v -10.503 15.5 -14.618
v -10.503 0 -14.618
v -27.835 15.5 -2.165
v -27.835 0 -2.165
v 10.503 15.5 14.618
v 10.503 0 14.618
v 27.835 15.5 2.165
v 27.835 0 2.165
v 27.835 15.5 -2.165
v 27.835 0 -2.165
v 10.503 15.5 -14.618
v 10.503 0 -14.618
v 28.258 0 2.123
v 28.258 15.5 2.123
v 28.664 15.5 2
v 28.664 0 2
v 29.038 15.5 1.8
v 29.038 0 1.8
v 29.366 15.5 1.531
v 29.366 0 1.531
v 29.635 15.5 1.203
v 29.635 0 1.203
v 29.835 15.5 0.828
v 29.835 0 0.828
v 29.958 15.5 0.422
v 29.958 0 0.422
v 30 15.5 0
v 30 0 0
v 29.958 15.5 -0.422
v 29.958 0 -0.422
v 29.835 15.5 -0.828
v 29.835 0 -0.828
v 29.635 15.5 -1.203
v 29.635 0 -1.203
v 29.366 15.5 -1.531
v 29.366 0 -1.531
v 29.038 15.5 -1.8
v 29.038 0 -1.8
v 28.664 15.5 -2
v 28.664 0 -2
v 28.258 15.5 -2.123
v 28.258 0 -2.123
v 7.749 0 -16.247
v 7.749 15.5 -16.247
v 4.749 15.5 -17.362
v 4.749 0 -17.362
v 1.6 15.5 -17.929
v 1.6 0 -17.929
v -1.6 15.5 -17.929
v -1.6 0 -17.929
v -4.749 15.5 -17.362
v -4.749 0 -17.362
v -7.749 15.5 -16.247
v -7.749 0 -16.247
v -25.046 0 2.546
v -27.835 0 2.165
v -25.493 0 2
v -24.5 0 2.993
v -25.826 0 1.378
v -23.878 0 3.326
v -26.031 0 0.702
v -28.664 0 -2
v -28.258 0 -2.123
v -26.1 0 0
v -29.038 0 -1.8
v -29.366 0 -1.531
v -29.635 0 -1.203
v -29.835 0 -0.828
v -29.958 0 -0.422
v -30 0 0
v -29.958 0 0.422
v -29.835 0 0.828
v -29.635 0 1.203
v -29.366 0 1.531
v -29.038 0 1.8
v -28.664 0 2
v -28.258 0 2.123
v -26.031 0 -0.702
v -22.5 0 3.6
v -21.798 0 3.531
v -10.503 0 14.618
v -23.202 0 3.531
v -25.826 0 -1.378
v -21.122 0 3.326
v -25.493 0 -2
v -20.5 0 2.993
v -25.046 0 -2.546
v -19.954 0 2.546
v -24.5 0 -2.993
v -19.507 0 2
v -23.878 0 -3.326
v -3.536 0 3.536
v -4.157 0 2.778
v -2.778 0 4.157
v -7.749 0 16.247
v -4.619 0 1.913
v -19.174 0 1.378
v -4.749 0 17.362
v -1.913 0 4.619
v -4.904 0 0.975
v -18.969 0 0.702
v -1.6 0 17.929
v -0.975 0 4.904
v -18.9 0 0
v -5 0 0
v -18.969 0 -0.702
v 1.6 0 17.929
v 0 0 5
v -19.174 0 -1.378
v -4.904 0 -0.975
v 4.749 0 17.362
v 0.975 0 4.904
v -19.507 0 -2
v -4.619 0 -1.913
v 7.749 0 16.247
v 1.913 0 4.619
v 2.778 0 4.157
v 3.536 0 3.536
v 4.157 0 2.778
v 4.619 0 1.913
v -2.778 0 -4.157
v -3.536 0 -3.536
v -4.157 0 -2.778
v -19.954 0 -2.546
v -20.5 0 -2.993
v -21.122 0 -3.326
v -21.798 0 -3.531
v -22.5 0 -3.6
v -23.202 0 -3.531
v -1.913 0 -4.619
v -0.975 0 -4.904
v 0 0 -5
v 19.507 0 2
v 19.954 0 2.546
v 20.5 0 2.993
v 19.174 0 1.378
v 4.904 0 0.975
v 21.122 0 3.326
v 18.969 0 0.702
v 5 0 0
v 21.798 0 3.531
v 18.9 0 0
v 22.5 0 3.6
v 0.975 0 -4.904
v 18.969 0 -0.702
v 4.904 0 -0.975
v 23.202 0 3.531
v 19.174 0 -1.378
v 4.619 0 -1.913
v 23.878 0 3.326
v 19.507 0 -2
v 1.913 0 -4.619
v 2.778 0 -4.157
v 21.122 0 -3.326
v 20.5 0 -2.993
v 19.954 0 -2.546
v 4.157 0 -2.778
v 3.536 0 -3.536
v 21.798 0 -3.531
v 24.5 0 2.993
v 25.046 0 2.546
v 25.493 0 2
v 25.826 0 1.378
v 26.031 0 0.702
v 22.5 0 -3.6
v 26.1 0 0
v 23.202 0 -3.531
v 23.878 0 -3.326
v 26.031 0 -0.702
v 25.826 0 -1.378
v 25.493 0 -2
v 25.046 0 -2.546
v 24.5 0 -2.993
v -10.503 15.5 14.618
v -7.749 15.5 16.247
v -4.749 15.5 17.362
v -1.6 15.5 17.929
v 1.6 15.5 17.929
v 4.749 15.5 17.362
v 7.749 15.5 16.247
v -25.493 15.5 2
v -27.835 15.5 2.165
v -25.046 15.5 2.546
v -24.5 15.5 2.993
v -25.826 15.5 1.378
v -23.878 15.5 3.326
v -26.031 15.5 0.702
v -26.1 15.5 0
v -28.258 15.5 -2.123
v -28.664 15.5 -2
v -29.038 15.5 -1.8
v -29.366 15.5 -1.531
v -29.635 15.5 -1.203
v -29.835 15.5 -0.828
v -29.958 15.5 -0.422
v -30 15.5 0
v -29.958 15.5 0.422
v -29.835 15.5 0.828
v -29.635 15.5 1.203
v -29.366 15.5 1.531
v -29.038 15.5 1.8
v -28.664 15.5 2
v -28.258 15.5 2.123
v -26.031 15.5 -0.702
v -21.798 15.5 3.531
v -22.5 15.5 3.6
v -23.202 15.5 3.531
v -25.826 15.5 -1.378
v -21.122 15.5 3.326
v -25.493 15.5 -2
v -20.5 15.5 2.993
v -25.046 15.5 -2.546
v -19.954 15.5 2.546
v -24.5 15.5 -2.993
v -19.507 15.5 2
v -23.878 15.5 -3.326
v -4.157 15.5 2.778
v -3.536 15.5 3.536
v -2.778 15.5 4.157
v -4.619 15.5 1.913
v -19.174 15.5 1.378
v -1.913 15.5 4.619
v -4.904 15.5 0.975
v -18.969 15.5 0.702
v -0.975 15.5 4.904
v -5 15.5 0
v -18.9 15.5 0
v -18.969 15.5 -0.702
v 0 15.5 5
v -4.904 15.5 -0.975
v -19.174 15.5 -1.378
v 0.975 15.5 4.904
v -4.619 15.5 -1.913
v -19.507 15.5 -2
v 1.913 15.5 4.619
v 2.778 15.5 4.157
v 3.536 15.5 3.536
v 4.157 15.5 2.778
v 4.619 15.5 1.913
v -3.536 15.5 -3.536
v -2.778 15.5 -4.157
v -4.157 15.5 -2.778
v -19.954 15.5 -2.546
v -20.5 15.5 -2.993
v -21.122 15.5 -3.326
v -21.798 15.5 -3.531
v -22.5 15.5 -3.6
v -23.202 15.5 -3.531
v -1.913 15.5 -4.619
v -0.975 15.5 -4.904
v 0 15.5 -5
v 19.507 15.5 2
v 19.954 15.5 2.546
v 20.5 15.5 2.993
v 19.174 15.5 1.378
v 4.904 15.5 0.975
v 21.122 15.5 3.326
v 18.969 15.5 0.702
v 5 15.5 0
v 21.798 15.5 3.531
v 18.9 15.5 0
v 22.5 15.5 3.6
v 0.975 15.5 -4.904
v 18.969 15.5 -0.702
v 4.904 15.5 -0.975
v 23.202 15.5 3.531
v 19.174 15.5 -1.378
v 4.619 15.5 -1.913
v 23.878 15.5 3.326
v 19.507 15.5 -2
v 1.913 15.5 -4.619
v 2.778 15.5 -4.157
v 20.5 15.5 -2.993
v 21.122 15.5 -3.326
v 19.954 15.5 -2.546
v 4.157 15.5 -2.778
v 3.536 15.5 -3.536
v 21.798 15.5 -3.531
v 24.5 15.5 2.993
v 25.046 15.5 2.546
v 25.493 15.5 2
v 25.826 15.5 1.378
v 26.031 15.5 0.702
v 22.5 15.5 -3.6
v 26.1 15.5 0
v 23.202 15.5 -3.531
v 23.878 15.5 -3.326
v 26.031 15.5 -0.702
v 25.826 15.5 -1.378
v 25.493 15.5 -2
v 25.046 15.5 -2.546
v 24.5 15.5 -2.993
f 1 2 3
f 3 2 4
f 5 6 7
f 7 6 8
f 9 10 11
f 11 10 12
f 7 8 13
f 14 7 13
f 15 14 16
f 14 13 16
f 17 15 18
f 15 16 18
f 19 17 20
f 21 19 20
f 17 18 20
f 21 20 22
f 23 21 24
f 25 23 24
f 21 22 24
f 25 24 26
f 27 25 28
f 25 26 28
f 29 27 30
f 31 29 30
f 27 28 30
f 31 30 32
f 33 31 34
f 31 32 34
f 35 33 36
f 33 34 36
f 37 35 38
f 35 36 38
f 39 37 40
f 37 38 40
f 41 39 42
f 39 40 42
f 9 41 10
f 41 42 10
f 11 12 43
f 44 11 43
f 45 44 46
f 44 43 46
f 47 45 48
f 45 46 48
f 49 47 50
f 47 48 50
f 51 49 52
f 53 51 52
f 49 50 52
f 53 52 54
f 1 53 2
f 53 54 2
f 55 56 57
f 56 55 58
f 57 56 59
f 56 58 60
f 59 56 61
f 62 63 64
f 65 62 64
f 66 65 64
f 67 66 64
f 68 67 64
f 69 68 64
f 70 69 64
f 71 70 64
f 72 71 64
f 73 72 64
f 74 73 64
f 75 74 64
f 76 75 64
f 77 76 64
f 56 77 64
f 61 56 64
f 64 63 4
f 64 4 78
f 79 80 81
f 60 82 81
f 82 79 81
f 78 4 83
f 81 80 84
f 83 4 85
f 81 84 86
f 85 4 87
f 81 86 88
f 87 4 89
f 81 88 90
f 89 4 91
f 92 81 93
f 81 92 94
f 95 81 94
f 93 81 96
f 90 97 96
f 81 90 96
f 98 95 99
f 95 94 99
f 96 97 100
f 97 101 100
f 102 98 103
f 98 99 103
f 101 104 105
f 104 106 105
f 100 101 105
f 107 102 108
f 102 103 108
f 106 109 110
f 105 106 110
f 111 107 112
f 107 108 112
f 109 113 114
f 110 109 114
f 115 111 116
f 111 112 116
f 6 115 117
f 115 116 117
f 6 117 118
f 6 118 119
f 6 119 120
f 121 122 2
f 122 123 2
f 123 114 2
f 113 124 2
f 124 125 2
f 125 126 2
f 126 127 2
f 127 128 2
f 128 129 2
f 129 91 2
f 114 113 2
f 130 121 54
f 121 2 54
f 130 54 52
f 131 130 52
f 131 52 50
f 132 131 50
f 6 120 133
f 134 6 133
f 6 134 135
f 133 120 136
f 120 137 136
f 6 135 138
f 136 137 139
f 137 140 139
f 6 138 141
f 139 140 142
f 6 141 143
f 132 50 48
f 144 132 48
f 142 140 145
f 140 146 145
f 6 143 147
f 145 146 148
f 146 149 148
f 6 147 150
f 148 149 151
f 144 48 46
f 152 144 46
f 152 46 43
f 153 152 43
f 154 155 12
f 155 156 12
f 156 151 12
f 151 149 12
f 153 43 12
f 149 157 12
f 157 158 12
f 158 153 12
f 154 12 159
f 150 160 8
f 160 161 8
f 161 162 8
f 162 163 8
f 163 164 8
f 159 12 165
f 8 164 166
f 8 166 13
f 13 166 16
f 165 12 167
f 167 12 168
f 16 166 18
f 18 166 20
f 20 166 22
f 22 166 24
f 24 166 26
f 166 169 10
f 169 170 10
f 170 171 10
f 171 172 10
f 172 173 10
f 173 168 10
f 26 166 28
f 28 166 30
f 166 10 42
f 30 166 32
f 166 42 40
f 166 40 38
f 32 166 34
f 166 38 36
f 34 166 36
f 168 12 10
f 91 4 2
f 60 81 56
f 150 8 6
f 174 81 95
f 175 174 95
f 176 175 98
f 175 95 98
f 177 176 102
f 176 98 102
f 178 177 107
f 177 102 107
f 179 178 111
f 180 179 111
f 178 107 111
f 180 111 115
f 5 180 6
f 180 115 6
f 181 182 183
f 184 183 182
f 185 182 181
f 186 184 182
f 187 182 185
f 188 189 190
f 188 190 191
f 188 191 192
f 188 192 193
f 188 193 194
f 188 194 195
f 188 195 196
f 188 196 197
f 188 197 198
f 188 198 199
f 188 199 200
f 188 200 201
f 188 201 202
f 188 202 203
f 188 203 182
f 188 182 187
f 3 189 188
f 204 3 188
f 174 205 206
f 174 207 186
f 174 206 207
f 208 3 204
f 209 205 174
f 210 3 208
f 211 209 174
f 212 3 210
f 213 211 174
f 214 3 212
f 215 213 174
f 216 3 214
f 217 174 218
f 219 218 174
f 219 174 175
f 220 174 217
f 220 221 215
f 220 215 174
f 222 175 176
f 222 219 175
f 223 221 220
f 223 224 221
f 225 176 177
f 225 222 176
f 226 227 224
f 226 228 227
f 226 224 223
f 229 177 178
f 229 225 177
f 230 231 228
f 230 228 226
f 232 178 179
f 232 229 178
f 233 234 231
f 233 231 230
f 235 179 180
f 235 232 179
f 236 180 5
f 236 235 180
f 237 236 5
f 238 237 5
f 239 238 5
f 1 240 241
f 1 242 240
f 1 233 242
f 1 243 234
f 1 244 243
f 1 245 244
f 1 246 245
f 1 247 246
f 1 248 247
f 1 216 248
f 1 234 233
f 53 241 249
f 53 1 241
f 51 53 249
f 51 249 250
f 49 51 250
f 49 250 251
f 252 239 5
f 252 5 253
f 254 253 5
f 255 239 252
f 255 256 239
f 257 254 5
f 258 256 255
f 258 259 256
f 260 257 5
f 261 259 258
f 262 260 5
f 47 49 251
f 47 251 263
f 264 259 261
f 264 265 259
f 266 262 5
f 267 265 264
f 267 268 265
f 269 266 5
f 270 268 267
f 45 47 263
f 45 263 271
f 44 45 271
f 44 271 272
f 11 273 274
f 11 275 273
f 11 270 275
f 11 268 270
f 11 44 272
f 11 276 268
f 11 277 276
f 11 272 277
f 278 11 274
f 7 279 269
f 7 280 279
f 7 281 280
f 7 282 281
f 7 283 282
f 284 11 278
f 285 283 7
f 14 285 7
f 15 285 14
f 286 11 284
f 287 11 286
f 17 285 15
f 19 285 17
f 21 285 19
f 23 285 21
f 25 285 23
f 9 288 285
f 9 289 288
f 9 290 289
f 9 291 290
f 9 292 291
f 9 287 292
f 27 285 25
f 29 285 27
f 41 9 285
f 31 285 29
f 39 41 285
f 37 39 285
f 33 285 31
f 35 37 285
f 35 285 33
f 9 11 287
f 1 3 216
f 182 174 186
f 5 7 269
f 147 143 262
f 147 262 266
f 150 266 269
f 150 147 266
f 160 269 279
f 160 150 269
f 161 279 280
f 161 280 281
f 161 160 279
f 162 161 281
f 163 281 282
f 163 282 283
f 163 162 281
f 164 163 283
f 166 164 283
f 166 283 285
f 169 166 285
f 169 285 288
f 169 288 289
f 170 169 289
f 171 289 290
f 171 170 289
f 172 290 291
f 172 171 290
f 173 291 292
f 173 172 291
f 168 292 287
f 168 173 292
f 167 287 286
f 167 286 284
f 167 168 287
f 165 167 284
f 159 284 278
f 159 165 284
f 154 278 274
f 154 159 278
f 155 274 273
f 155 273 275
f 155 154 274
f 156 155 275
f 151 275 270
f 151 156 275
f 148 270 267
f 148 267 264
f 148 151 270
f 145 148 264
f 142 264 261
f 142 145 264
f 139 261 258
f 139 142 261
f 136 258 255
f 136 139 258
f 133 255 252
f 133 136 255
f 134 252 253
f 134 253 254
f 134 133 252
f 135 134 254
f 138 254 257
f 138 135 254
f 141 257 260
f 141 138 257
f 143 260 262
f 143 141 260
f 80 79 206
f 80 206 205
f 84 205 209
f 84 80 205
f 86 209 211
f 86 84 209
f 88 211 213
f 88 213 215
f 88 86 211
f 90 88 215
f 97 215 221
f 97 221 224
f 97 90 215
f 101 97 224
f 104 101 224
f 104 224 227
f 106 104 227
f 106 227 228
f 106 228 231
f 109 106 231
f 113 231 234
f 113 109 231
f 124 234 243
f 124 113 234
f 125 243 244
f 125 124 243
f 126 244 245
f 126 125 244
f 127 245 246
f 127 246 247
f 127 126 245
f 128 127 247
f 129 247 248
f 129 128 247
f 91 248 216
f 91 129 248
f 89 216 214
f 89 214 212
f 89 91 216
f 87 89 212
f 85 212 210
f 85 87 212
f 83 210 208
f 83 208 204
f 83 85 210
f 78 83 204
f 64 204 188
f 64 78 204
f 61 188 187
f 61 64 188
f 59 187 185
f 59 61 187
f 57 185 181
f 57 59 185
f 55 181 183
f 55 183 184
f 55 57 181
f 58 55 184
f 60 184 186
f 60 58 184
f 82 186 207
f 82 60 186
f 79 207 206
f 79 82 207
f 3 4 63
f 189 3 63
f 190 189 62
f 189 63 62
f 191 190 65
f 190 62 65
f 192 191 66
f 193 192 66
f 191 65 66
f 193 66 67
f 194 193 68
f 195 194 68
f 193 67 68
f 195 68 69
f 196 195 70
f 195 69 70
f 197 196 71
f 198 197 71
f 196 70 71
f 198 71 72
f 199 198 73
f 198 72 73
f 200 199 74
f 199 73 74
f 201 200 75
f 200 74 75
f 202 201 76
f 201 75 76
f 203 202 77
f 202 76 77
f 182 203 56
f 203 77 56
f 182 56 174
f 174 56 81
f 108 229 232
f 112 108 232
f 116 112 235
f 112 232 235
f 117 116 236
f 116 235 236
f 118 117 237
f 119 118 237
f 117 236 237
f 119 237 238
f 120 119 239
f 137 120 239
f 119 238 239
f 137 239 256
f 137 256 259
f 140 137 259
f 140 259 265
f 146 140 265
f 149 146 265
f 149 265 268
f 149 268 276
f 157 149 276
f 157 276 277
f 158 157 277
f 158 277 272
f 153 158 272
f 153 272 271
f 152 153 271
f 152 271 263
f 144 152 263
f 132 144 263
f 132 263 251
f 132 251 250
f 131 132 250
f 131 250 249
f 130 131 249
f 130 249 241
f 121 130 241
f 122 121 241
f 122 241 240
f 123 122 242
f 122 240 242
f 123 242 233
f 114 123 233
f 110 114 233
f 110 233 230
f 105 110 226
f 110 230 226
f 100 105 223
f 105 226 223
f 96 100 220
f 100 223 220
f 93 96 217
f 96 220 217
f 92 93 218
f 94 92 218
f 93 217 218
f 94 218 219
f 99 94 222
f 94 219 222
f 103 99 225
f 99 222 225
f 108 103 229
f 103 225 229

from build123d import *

# Parameters (mm, degrees)
SKETCH_1_R          = 3.6
EXTRUDE_1_DEPTH     = 15.5
SKETCH_2_R          = 5
CUT_EXTRUDE_1_DEPTH = 31.5


with BuildPart() as part:
    # 草图1 → 凸台-拉伸1 (new body)
    with BuildSketch(Plane(origin=(0, 0, 0), x_dir=(1, 0, 0), z_dir=(0, 1, 0))):
        with BuildLine():
            Line((27.835232693, 2.164767307), (10.503072433, 14.617984453))
            ThreePointArc((10.503072433, 14.617984453), (0, 18), (-10.503072433, 14.617984453))
            Line((-10.503072433, 14.617984453), (-27.835232693, 2.164767307))
            ThreePointArc((-27.835232693, 2.164767307), (-30, 0), (-27.835232693, -2.164767307))
            Line((-27.835232693, -2.164767307), (-10.503072433, -14.617984453))
            ThreePointArc((-10.503072433, -14.617984453), (0, -18), (10.503072433, -14.617984453))
            Line((10.503072433, -14.617984453), (27.835232693, -2.164767307))
            ThreePointArc((27.835232693, -2.164767307), (30, 0), (27.835232693, 2.164767307))
        make_face()
        with Locations(Location((-22.5, 0, 0), (0, 0, 270))):
            Circle(SKETCH_1_R, mode=Mode.SUBTRACT)
        with Locations(Location((22.5, 0, 0), (0, 0, 270))):
            Circle(SKETCH_1_R, mode=Mode.SUBTRACT)
    extrude(amount=EXTRUDE_1_DEPTH)

    # 草图2 → 切除-拉伸1 (cut)
    with BuildSketch(Plane(origin=(0, 15.5, 0), x_dir=(1, 0, 0), z_dir=(0, 1, 0))):
        with Locations(Location((0, 0, 0), (0, 0, 270))):
            Circle(SKETCH_2_R)
    extrude(amount=-CUT_EXTRUDE_1_DEPTH, mode=Mode.SUBTRACT)


solid = part.part
